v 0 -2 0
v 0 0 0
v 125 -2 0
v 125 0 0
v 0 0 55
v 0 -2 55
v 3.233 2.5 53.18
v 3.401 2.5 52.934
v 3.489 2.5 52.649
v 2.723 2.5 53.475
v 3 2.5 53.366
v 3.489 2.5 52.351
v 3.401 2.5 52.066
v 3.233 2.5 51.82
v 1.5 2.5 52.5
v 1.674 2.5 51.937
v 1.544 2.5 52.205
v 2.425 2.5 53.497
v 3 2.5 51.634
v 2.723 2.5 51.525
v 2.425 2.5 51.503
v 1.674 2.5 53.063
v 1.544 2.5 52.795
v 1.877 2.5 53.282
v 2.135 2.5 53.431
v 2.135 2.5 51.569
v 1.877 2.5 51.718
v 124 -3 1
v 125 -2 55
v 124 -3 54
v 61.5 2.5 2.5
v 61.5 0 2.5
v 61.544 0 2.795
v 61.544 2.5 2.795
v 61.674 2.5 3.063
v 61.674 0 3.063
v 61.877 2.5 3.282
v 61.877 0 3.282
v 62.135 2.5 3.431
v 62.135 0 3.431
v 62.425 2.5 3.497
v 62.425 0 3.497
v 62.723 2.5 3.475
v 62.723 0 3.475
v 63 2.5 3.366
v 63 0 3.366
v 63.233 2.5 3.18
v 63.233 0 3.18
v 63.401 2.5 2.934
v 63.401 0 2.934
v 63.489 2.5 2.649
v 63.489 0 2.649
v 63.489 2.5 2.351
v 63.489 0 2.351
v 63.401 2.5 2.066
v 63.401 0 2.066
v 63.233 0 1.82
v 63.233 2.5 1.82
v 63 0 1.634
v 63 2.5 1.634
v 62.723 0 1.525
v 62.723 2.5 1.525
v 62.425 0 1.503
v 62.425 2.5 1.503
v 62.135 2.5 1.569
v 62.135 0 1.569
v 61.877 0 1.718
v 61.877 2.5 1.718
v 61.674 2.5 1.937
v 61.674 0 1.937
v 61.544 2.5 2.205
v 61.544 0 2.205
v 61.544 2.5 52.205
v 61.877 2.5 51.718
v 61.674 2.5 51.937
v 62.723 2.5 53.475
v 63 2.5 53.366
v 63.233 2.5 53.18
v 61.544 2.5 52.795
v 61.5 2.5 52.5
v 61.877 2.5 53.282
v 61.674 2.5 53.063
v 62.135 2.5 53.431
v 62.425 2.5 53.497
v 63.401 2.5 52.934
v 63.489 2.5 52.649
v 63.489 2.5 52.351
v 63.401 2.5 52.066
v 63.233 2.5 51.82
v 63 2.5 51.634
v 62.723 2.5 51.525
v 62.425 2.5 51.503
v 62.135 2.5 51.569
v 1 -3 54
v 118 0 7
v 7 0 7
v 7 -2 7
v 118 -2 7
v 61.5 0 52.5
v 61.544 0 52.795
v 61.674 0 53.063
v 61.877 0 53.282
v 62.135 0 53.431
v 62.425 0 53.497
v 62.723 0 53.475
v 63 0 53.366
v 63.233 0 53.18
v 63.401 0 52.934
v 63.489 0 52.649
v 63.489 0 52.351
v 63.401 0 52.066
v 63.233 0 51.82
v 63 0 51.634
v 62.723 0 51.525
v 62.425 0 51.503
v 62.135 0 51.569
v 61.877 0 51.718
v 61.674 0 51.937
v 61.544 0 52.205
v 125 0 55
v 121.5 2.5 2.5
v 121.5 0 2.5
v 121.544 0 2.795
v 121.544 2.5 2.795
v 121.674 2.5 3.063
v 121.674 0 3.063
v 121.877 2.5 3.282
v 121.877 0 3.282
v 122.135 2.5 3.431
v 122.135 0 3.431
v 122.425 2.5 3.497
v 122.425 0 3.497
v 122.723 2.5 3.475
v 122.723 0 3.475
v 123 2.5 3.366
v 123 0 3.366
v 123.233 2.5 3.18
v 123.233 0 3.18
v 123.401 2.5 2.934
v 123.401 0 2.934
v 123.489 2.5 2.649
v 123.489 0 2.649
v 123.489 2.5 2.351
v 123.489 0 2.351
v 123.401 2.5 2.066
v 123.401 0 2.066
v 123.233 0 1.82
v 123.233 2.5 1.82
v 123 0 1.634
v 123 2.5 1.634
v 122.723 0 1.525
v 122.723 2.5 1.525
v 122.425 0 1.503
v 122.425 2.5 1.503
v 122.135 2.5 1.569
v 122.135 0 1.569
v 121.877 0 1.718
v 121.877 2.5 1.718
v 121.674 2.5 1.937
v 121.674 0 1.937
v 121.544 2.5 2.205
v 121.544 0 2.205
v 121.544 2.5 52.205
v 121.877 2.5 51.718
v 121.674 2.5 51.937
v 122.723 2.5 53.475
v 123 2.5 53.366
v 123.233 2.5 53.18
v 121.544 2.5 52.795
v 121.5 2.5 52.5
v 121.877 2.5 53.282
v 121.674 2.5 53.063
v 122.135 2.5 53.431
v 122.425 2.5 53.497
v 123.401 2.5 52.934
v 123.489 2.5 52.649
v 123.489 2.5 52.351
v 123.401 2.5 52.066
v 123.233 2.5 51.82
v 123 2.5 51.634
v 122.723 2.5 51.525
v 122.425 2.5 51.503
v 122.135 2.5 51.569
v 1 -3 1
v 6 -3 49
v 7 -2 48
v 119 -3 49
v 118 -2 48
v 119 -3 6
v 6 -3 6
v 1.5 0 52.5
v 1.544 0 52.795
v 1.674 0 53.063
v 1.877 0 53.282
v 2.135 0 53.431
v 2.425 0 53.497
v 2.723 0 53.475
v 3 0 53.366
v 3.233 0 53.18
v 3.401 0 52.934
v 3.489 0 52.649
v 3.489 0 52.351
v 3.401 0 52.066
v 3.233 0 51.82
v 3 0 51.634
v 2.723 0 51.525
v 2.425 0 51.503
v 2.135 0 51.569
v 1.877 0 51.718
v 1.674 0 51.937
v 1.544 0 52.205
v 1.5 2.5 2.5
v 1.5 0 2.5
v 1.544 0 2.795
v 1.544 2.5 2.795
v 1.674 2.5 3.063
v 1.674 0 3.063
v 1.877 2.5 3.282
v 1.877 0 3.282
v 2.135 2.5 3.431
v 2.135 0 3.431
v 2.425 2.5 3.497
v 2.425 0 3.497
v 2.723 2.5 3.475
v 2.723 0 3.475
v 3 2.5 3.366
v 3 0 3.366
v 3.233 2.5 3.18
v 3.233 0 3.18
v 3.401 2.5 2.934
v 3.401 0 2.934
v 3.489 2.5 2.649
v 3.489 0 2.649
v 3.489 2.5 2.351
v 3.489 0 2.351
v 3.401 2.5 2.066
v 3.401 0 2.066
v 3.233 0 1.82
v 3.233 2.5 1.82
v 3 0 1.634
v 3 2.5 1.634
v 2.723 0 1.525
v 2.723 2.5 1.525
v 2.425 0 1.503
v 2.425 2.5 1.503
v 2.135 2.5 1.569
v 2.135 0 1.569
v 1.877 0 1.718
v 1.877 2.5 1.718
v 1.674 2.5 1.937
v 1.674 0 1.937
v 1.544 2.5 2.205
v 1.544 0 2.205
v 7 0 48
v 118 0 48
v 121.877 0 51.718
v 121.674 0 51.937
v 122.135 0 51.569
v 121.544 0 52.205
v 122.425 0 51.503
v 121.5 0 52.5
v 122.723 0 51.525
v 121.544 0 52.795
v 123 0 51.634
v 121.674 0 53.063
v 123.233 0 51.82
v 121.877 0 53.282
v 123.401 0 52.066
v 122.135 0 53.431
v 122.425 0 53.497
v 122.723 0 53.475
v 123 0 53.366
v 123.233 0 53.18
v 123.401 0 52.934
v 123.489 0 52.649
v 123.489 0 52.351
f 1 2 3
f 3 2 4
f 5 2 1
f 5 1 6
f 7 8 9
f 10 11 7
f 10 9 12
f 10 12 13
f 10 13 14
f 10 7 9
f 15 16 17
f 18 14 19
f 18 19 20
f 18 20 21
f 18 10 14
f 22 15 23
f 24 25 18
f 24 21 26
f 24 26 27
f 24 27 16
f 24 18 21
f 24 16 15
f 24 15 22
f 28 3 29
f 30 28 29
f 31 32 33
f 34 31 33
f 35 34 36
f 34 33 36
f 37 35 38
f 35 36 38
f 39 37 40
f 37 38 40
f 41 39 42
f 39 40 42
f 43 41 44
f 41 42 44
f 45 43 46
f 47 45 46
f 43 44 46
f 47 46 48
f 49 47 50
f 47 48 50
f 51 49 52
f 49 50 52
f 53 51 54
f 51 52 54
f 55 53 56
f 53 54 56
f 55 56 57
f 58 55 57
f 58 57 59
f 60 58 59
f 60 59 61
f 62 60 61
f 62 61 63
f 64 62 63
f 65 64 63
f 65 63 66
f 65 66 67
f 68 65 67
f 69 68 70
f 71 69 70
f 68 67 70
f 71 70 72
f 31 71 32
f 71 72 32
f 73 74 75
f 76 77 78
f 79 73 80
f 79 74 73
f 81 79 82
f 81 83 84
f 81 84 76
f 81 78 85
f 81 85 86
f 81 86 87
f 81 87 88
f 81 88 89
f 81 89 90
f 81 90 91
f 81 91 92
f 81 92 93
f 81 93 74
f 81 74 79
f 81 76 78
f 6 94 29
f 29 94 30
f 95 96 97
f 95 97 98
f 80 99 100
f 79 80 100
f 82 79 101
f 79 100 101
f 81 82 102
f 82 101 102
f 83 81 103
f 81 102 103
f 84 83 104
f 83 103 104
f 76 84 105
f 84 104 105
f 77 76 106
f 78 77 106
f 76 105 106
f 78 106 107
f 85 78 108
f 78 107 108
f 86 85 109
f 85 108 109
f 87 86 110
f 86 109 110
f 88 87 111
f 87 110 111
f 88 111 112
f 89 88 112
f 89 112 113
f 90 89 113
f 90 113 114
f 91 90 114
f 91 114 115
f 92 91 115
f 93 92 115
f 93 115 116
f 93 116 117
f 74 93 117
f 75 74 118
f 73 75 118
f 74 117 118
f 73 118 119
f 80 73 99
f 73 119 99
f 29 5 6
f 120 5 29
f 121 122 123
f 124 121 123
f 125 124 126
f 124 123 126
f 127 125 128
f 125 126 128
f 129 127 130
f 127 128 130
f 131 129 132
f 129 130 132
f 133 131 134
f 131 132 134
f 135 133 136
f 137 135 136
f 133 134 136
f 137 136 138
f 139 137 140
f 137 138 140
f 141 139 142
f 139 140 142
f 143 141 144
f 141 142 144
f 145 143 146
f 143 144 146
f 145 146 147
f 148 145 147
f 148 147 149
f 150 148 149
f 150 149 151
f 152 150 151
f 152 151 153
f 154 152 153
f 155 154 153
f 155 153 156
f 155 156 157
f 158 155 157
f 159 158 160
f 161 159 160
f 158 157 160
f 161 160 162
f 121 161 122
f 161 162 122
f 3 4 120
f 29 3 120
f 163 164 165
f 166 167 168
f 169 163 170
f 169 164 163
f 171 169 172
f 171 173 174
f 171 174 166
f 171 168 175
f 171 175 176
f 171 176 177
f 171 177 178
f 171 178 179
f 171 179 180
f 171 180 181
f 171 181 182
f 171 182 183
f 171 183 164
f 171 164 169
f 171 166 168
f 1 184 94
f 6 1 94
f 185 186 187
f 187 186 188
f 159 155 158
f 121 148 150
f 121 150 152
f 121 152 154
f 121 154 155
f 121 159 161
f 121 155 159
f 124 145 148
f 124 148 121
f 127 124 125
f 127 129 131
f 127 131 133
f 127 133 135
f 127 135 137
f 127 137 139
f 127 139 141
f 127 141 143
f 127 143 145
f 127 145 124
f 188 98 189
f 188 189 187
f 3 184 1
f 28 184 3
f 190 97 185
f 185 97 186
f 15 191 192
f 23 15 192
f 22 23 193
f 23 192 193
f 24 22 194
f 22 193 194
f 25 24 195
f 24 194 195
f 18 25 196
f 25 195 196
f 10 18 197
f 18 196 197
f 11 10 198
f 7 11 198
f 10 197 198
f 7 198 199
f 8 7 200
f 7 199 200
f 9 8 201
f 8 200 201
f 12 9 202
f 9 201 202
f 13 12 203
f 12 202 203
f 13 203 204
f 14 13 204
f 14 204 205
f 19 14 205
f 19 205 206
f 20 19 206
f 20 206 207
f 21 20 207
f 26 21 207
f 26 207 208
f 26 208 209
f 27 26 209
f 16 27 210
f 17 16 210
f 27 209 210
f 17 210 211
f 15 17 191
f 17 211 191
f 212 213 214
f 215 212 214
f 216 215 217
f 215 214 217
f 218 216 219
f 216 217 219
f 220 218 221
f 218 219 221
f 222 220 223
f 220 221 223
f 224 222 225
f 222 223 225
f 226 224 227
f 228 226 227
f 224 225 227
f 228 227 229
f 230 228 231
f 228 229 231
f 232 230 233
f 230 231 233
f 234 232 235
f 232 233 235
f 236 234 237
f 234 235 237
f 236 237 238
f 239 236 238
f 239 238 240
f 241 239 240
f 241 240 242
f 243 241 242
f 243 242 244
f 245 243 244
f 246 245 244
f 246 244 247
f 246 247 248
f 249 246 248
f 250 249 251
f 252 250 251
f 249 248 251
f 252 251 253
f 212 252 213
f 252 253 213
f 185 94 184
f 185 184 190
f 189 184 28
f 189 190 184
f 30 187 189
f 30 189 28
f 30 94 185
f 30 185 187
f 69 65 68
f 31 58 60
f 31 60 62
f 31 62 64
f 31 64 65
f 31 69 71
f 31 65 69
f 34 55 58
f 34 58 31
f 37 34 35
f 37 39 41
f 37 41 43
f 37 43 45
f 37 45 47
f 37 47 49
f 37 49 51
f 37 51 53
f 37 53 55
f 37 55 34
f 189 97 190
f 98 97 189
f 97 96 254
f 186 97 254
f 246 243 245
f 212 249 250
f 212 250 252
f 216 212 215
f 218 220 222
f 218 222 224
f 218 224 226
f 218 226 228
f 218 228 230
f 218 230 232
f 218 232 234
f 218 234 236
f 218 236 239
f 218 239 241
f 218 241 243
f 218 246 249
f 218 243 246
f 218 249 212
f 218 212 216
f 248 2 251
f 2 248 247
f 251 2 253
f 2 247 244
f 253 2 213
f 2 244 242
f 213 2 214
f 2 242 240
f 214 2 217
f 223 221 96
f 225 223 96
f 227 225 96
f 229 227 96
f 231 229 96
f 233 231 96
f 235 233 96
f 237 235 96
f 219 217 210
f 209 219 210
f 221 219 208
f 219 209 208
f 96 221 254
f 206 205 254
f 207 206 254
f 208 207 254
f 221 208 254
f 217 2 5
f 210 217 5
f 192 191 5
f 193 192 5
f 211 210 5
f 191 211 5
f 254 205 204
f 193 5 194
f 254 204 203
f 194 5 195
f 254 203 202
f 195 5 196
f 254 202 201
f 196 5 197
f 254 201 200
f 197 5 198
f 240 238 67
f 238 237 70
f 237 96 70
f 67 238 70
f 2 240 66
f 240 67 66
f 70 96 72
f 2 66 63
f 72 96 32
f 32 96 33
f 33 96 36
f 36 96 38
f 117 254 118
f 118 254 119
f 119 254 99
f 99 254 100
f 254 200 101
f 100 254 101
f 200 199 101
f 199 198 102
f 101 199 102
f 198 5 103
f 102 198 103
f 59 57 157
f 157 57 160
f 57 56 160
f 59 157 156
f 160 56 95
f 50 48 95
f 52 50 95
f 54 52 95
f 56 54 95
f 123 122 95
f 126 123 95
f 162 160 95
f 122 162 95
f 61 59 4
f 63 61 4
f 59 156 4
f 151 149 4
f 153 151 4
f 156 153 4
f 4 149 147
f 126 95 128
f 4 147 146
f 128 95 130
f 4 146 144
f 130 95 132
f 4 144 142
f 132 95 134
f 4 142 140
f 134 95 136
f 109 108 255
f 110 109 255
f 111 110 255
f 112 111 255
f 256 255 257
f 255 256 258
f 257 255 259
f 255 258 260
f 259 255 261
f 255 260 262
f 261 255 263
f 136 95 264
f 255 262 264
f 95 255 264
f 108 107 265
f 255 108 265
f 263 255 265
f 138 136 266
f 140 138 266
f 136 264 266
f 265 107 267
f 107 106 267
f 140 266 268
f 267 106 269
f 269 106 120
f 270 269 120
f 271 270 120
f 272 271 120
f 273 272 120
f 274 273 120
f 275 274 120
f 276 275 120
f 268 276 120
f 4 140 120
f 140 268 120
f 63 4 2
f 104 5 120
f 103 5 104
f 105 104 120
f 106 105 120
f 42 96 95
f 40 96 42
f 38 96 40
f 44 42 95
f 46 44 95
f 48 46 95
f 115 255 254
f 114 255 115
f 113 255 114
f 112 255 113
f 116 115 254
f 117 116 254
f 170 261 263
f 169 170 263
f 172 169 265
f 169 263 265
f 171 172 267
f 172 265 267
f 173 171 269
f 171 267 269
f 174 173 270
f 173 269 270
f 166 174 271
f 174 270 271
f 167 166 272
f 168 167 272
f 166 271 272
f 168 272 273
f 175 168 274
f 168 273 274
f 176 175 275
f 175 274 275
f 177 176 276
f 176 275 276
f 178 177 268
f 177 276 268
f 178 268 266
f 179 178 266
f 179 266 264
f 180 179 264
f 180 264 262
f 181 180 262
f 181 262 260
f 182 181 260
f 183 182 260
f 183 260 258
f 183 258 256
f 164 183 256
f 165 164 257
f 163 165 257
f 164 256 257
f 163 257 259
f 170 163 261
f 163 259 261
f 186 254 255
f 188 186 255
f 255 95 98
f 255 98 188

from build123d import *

# Parameters (mm, degrees)
F0_W     = 125
F0_H     = 55
F0_W_2   = 111
F0_H_2   = 41
F1_DEPTH = 3
F2_R     = 1
F3_DEPTH = 2.5
F4_SIZE  = 1


with BuildPart() as f1:
    # F0 (on Front) → F1 (new body)
    with BuildSketch(Plane.XZ):
        with Locations((62.5, 27.5)):
            Rectangle(F0_W, F0_H)
        with Locations((62.5, 27.5)):
            Rectangle(F0_W_2, F0_H_2, mode=Mode.SUBTRACT)
    extrude(amount=F1_DEPTH)

    # F2 (on face) → F3 (join)
    with BuildSketch(Plane(origin=(0, 0, 0), x_dir=(-1, 0, 0), z_dir=(0, 1, 0))):
        with Locations((-2.5, 52.5)):
            Circle(F2_R)
        with Locations((-62.5, 2.5)):
            Circle(F2_R)
        with Locations((-122.5, 52.5)):
            Circle(F2_R)
        with Locations((-122.5, 2.5)):
            Circle(F2_R)
        with Locations((-62.5, 52.5)):
            Circle(F2_R)
        with Locations((-2.5, 2.5)):
            Circle(F2_R)
    extrude(amount=F3_DEPTH)

    # F4
    f4_edges = [f1.edges().sort_by_distance(p)[0] for p in [
        (0, -3, 27.5),
        (62.5, -3, 0),
        (125, -3, 27.5),
        (62.5, -3, 55),
        (62.5, -3, 48),
        (118, -3, 27.5),
        (62.5, -3, 7),
        (7, -3, 27.5),
    ]]
    chamfer(f4_edges, length=F4_SIZE)


solid = f1.part
